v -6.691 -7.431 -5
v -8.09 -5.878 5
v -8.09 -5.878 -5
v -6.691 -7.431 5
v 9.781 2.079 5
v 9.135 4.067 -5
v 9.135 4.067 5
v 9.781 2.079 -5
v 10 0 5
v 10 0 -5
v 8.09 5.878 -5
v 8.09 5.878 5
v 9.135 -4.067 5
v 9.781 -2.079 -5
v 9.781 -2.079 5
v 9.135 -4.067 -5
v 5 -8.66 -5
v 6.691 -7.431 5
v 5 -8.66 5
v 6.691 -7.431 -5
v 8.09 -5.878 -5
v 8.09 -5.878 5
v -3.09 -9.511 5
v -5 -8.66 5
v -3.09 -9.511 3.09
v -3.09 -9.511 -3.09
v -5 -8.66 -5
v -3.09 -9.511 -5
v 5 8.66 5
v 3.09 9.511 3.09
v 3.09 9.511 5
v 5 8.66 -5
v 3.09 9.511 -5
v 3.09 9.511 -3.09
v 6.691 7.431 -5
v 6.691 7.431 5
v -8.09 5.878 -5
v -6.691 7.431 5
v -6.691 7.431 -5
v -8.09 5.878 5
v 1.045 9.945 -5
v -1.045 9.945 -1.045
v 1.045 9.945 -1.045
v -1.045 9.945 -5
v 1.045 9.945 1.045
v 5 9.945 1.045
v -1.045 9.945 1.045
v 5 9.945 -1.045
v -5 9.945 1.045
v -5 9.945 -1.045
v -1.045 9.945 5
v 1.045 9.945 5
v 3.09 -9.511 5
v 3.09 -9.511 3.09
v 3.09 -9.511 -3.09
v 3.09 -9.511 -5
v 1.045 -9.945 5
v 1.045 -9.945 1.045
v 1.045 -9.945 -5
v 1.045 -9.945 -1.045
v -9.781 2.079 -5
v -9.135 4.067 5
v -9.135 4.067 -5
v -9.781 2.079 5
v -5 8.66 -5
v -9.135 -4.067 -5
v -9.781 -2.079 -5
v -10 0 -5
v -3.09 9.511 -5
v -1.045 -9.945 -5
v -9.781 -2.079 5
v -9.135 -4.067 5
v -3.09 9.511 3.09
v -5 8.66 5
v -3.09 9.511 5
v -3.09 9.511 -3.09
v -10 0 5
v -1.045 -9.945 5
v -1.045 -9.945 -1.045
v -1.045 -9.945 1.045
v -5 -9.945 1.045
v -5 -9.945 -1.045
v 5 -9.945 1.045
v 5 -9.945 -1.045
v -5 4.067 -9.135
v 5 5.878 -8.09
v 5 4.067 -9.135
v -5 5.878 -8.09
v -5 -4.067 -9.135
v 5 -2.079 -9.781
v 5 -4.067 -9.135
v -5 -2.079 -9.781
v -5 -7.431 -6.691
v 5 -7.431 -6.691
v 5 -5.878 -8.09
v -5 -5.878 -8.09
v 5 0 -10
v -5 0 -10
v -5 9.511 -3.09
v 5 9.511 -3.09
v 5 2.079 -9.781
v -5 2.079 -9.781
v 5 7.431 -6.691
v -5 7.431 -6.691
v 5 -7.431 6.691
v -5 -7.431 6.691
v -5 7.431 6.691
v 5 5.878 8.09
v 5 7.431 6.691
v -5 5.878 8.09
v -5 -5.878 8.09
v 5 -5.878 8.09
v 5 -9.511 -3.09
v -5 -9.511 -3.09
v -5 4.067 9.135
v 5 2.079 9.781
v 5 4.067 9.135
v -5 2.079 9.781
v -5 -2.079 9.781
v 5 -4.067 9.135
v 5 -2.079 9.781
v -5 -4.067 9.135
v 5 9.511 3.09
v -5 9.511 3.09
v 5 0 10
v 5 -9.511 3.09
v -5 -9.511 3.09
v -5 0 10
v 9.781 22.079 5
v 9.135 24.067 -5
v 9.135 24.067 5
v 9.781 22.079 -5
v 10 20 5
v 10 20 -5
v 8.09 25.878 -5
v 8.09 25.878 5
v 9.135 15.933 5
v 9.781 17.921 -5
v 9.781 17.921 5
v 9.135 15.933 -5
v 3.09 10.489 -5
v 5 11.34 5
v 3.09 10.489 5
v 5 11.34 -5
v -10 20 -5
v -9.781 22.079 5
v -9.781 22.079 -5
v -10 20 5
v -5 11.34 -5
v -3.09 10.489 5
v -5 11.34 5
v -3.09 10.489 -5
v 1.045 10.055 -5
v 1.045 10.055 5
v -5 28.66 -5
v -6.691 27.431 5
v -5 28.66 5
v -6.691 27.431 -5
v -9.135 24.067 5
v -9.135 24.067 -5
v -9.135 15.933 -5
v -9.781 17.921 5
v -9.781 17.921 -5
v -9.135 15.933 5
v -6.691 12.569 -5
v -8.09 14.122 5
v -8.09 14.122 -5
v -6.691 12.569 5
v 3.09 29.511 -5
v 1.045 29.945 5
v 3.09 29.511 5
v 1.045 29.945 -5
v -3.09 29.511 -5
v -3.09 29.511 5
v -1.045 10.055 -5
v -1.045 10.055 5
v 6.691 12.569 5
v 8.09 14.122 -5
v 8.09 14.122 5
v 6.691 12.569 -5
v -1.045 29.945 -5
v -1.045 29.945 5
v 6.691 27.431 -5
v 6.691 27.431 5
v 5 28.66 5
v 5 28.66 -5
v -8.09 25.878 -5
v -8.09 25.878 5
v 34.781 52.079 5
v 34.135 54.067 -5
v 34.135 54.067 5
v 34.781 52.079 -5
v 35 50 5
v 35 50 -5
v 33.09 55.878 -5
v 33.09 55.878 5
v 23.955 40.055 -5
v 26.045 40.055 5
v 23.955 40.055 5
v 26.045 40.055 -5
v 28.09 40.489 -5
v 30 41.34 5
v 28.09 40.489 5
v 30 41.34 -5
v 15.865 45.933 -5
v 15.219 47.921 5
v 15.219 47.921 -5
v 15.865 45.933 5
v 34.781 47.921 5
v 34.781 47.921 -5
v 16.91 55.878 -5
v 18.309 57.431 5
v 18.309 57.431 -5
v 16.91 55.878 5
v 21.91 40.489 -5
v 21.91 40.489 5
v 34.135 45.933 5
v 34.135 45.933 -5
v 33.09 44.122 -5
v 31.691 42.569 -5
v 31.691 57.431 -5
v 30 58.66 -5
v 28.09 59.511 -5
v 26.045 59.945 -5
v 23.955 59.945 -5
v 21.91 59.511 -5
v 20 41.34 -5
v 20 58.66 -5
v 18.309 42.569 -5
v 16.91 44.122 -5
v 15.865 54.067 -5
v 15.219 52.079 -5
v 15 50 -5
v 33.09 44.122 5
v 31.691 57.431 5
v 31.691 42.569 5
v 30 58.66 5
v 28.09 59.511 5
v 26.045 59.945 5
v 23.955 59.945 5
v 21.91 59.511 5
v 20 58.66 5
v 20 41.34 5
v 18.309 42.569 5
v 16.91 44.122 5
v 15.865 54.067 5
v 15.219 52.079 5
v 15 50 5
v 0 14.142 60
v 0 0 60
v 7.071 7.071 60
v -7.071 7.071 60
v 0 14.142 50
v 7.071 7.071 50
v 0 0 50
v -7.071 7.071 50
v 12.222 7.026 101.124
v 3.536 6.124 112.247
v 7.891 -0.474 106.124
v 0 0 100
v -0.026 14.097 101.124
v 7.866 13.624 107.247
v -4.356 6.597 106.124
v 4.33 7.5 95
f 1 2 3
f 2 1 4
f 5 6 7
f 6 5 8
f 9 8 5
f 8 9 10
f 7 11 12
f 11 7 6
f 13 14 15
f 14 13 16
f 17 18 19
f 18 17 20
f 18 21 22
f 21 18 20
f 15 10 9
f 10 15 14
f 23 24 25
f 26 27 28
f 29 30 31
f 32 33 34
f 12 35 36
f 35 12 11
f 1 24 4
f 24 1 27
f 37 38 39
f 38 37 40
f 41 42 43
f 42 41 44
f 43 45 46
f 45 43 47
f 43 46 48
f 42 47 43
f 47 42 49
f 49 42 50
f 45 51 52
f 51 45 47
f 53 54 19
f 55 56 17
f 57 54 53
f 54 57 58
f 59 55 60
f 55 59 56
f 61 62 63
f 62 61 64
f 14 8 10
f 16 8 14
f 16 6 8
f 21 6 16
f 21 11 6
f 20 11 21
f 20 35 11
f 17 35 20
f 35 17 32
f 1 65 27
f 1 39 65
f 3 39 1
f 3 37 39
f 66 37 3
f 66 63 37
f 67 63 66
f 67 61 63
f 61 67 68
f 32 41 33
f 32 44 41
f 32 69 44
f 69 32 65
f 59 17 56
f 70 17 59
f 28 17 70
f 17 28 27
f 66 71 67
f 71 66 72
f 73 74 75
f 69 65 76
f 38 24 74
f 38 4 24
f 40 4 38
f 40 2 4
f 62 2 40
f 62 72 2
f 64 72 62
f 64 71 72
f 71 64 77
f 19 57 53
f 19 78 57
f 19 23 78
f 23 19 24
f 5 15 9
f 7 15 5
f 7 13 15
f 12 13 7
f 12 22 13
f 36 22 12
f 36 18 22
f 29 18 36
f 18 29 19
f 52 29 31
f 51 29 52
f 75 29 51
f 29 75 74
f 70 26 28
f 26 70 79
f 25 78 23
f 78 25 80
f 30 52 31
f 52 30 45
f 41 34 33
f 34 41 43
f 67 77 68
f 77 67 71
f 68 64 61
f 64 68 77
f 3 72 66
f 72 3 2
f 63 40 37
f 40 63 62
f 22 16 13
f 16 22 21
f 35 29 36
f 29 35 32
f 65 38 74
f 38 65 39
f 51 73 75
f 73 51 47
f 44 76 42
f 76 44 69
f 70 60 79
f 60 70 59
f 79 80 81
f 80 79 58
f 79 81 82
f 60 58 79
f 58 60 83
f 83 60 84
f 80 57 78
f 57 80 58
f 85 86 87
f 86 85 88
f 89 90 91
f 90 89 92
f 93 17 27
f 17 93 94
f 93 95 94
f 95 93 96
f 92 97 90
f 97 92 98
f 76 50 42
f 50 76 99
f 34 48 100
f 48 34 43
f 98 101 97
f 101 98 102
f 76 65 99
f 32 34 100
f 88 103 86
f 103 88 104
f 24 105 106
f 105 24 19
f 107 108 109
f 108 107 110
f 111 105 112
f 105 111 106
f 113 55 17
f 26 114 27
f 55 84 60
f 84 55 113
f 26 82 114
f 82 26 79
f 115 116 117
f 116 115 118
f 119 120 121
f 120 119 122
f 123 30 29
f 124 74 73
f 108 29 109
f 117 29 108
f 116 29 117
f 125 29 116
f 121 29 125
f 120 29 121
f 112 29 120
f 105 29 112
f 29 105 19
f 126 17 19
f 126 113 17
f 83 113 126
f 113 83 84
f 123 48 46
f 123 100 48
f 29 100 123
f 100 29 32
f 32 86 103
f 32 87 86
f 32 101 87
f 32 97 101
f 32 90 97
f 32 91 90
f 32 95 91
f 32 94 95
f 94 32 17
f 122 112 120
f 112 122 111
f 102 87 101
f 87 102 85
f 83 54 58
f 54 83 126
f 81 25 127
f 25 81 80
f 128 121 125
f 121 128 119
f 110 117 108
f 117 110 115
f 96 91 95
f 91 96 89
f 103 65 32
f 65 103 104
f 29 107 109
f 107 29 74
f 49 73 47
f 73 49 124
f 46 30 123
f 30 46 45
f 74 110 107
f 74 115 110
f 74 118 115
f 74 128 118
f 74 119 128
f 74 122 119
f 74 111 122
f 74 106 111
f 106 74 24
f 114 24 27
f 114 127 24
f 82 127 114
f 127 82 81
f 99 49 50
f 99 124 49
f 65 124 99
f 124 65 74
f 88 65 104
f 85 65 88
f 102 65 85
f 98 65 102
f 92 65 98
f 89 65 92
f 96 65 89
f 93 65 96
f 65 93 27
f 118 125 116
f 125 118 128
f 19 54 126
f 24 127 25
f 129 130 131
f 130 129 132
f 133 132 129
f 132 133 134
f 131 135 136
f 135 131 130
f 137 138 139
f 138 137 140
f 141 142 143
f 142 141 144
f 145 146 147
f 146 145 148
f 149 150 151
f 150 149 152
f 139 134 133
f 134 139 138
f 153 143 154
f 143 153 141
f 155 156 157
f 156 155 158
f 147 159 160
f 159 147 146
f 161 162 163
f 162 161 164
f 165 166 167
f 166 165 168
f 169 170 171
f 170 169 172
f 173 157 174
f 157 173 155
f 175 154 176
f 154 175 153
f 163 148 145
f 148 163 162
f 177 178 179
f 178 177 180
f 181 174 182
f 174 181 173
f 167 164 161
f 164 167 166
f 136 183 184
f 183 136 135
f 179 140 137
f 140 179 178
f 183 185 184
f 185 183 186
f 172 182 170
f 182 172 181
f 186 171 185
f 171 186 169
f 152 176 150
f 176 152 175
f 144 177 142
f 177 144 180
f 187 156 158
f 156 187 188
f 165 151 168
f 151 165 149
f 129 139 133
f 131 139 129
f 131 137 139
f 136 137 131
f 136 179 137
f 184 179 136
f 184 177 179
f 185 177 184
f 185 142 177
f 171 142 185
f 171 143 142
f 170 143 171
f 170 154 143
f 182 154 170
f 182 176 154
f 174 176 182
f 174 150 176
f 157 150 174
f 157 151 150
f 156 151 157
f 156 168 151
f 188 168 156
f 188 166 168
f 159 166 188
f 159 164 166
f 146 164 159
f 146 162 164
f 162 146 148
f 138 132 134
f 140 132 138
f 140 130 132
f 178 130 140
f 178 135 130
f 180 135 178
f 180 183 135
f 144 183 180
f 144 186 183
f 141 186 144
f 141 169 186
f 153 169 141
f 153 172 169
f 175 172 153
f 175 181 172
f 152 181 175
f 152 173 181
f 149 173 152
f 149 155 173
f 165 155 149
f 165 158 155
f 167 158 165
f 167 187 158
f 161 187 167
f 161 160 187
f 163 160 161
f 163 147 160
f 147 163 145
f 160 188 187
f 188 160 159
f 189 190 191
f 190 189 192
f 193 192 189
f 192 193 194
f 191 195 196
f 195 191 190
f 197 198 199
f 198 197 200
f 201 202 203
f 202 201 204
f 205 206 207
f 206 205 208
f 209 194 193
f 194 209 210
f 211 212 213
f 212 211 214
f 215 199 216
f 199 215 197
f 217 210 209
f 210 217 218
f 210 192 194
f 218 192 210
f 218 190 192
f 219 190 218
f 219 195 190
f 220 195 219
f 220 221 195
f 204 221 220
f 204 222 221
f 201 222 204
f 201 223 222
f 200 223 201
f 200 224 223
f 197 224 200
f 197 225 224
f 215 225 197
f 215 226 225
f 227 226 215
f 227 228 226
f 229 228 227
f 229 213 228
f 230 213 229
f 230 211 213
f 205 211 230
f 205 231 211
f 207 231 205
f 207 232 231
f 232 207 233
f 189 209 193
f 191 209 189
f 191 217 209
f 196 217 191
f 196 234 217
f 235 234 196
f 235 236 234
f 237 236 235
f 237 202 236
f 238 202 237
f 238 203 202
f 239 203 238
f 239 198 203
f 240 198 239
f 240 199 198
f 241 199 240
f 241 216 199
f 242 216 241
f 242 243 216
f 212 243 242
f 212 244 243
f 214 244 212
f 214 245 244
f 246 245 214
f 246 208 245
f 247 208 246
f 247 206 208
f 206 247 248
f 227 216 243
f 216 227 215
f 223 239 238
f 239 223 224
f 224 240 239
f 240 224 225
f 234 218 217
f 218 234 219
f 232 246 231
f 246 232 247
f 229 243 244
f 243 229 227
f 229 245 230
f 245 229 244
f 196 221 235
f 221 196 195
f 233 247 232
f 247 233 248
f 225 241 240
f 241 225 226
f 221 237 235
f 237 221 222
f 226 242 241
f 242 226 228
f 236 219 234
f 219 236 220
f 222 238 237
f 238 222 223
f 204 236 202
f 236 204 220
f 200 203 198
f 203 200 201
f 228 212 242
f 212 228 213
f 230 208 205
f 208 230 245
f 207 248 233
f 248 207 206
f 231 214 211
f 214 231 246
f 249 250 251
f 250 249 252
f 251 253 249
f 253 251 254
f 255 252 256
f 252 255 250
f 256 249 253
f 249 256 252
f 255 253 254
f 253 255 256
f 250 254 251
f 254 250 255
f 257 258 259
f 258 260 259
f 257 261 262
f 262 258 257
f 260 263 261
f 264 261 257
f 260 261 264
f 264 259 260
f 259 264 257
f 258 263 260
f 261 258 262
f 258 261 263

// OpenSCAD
//Cilindro1
cylinder(r=10, h=10, center=true);

//Cilindro2
rotate([0, 90, 0]) {
    cylinder(r=10, h=10, center=true);
}

//Cilindro3
translate([0, 20, 0]) {
    cylinder(r=10, h=10, center=true);
}

//Cilindro4
translate([25, 25, 0]) {
    translate([0, 25, 0]) {
        cylinder(r=10, h=10, center=true);
    }
}

//cube 1
translate([0, 0, 50]) {
    // Rotate 45 degrees around the Z-axis
    rotate(a=45, v=[0, 0, 1]) {
        cube(10);
    }
}

//cube 2
translate([0, 0, 100]) {
    // Rotate 45 degrees around the X-axis, 30 degrees around the Y-axis, and 60 degrees around the Z-axis
    rotate([45, 30, 60]) {
        cube(10);
    }
}
